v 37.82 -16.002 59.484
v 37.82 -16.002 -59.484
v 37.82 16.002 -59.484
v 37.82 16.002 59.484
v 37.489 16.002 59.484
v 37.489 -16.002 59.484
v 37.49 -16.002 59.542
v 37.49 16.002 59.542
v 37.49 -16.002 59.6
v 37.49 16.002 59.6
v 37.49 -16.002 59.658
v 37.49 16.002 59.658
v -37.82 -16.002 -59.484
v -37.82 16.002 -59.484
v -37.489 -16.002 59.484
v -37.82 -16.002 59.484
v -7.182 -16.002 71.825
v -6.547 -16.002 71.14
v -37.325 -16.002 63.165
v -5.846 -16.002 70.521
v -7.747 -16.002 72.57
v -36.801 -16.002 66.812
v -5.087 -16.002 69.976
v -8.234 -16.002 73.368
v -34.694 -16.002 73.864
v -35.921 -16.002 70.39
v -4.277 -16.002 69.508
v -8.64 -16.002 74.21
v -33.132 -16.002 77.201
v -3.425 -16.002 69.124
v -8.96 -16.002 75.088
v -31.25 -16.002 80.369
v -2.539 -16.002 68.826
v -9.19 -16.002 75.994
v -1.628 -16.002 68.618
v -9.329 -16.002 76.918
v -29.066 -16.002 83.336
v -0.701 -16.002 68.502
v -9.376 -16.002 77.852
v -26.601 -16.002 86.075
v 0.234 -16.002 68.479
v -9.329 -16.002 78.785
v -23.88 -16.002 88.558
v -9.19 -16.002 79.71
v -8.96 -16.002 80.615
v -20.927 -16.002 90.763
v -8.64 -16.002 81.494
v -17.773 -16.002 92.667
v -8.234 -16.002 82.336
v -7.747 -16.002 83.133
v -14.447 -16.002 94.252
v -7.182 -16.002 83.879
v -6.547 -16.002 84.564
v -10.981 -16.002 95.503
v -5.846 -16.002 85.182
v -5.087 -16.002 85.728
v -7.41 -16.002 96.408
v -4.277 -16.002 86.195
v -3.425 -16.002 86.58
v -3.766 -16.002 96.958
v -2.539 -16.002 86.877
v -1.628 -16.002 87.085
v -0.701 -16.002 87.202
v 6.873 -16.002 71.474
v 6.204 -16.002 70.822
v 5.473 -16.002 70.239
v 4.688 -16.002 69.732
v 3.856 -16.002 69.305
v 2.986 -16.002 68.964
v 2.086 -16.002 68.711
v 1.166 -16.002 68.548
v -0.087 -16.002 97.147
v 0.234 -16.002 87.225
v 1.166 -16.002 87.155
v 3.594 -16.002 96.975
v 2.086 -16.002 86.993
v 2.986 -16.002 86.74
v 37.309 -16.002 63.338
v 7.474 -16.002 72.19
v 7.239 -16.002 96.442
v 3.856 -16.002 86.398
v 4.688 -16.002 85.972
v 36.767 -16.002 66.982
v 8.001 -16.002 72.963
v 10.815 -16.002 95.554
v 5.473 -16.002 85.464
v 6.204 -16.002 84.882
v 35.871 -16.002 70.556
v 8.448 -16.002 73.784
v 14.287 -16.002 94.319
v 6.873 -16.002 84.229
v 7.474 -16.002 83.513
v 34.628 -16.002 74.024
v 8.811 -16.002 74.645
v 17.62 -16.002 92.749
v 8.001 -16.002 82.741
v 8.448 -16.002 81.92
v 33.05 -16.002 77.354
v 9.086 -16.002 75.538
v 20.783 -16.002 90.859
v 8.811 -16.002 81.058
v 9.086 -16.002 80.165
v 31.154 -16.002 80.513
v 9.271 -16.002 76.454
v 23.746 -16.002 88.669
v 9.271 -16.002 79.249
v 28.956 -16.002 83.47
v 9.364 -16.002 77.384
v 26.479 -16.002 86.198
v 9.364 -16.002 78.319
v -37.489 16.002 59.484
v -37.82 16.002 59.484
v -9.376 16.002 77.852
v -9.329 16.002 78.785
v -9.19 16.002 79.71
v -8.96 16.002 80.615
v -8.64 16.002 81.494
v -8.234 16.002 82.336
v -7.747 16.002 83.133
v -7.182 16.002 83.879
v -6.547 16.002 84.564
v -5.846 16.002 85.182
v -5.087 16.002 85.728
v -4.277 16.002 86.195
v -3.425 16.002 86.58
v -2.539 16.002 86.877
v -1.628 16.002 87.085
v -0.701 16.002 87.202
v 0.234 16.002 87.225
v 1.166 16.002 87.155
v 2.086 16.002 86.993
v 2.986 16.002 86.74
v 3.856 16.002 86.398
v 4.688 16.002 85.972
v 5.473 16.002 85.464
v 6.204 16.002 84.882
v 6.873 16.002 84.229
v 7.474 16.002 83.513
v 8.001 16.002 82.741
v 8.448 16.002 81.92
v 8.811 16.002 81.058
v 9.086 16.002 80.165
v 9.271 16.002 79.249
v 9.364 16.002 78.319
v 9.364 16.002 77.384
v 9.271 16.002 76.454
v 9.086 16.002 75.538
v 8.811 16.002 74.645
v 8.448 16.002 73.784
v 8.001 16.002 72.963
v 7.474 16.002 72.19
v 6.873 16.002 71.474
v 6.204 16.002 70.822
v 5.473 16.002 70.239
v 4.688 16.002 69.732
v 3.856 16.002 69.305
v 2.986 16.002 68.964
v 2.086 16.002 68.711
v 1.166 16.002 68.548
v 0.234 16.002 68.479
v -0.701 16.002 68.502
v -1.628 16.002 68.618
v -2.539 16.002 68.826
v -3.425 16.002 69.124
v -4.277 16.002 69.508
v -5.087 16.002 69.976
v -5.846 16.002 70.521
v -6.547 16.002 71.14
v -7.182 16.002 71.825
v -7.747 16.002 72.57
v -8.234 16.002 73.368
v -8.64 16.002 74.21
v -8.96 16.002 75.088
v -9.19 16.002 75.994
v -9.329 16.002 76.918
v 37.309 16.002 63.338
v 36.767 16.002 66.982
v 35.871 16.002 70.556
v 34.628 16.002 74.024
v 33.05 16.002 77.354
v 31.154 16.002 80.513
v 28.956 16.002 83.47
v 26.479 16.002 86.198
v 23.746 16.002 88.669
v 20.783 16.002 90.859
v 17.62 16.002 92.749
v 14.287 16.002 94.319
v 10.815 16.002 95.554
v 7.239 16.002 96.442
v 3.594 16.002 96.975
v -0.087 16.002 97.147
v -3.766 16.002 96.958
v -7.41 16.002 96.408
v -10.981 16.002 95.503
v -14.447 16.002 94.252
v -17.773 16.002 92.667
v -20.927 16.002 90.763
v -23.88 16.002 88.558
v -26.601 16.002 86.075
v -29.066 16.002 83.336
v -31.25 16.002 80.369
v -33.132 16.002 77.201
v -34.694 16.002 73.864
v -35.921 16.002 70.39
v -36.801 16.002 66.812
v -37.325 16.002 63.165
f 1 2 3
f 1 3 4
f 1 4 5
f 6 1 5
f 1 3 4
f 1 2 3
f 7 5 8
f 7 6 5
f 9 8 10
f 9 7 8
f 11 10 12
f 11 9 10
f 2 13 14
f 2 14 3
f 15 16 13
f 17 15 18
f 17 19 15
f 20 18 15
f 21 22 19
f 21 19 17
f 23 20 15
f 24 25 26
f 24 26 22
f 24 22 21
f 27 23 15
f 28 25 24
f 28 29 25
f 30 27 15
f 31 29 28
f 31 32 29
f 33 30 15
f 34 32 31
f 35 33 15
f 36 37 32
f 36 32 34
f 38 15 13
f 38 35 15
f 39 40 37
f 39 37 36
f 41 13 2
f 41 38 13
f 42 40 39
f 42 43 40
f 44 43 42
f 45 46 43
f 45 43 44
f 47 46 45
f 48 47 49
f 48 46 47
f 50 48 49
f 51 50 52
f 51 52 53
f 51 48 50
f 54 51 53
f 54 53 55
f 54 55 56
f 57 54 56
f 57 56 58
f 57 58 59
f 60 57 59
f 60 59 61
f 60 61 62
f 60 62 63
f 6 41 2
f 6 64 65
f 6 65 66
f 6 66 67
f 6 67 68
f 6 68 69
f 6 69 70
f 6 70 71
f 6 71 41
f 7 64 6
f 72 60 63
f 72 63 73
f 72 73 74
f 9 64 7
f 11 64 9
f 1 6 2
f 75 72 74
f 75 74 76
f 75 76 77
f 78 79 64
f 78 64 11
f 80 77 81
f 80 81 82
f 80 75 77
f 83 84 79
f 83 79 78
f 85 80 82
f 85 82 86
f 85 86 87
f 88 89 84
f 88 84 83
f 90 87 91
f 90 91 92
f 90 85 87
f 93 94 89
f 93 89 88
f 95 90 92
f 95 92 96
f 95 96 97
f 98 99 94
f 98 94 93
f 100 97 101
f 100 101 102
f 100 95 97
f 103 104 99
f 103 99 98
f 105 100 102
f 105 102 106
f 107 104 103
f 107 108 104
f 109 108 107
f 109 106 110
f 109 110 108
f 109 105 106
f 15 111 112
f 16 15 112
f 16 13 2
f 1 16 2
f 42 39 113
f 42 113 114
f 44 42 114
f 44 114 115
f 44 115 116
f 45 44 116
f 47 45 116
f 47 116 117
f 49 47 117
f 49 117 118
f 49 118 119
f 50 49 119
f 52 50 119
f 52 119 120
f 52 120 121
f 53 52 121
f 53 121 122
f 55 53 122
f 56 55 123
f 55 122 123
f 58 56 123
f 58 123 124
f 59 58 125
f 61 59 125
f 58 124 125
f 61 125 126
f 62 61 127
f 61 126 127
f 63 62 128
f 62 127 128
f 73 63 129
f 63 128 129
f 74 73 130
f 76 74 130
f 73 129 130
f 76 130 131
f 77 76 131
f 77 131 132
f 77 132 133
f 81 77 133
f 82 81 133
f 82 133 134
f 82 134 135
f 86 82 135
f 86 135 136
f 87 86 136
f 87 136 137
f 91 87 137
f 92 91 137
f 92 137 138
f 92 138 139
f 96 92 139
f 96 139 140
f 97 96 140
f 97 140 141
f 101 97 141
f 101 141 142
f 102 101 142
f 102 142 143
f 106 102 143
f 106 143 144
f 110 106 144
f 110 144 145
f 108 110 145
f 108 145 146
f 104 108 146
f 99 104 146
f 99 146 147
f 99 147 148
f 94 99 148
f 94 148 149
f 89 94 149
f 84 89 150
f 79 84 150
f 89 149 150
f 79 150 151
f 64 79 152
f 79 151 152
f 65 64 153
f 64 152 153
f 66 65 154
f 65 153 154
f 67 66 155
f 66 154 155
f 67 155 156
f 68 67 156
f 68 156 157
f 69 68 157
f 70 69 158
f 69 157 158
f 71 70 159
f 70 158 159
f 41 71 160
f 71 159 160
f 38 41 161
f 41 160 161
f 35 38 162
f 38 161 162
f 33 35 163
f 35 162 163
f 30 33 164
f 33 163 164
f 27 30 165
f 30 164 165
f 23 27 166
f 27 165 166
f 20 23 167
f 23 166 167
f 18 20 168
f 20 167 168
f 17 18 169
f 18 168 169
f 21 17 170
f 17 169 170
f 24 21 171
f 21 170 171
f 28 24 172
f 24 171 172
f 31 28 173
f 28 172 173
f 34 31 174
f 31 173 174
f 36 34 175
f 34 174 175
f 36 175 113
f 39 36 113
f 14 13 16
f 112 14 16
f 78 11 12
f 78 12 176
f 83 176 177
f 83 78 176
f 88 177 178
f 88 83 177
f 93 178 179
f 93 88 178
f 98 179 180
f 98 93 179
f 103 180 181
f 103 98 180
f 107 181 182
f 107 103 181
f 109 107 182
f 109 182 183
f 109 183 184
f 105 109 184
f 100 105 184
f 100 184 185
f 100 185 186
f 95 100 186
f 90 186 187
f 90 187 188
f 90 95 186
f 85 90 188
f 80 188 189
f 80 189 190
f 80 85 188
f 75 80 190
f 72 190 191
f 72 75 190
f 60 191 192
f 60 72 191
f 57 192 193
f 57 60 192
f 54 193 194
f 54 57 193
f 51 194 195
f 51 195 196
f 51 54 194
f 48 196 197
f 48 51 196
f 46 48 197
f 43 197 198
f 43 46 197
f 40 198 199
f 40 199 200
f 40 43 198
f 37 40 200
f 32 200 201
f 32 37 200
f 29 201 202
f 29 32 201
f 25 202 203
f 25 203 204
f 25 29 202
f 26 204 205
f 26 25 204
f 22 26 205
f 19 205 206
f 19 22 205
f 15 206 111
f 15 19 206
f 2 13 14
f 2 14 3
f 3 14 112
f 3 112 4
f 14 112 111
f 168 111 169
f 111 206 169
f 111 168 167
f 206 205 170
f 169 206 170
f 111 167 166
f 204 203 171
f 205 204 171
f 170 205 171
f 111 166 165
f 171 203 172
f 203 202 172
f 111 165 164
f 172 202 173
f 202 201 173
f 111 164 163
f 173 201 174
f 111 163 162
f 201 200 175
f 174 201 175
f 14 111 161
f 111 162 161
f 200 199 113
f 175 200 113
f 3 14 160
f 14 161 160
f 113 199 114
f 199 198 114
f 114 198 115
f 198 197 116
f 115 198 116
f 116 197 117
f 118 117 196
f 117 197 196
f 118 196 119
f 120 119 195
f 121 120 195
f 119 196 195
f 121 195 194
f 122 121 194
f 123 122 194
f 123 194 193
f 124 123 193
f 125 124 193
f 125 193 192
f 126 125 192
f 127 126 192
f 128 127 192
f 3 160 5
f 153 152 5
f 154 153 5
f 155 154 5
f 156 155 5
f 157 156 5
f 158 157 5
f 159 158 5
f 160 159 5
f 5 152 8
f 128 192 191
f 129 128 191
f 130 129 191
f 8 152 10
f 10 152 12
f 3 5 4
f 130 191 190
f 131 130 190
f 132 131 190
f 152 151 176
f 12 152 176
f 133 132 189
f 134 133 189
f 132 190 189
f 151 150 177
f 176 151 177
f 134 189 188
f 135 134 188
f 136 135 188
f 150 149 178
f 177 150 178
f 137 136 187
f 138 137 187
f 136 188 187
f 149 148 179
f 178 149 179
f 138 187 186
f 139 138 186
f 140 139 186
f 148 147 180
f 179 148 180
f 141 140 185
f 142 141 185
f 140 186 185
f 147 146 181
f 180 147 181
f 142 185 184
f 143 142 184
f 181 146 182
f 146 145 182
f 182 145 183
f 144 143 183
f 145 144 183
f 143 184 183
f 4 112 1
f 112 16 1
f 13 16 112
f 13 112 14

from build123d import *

# Parameters (mm, degrees)
F2_DEPTH = 16.002
F0_W     = 75.6393447518
F0_H     = 118.9685091376
F3_R     = 9.3760828489
F4_DEPTH = 89.662


with BuildPart() as f2:
    # F1 (on face) → F2 (new body, symmetric)
    with BuildSketch(Plane.XZ):
        with BuildLine():
            Line((37.4894359182, 59.4842545688), (-37.4894359182, 59.4842545688))
            ThreePointArc((-37.4894359182, 59.4842545688), (0, 22.1678595101), (37.4894359182, 59.4842545688))
        make_face()
        with BuildLine():
            ThreePointArc((37.4894359182, 59.4842545688), (37.4897368227, 59.5709753697), (37.4898371244, 59.6576966345))
            ThreePointArc((37.4898371244, 59.6576966345), (-0.0867212649, 97.1474334573), (-37.4894359182, 59.4842545688))
            Line((-37.4894359182, 59.4842545688), (37.4894359182, 59.4842545688))
        make_face()
        with BuildLine():
            ThreePointArc((37.4894359182, 59.4842545688), (0, 22.1678595101), (-37.4894359182, 59.4842545688))
            Line((-37.4894359182, 59.4842545688), (-37.8196723759, 59.4842545688))
            Line((-37.8196723759, 59.4842545688), (-37.8196723759, -59.4842545688))
            Line((-37.8196723759, -59.4842545688), (37.8196723759, -59.4842545688))
            Line((37.8196723759, -59.4842545688), (37.8196723759, 59.4842545688))
            Line((37.8196723759, 59.4842545688), (37.4894359182, 59.4842545688))
        make_face()
    extrude(amount=F2_DEPTH, both=True)

    # F3 (on face) → F4 (cut)
    with BuildSketch(Plane(origin=(0, 16.002, 0), x_dir=(-1, 0, 0), z_dir=(0, 1, 0))):
        with Locations((0, 77.8516829014)):
            Circle(F3_R)
    extrude(amount=-F4_DEPTH, mode=Mode.SUBTRACT)


with BuildPart() as f2b:
    # F0 (on Front) → F2, piece 2 (new body, symmetric)
    with BuildSketch(Plane.XZ):
        Rectangle(F0_W, F0_H)
    extrude(amount=F2_DEPTH, both=True)


solid = Compound([f2.part, f2b.part])
